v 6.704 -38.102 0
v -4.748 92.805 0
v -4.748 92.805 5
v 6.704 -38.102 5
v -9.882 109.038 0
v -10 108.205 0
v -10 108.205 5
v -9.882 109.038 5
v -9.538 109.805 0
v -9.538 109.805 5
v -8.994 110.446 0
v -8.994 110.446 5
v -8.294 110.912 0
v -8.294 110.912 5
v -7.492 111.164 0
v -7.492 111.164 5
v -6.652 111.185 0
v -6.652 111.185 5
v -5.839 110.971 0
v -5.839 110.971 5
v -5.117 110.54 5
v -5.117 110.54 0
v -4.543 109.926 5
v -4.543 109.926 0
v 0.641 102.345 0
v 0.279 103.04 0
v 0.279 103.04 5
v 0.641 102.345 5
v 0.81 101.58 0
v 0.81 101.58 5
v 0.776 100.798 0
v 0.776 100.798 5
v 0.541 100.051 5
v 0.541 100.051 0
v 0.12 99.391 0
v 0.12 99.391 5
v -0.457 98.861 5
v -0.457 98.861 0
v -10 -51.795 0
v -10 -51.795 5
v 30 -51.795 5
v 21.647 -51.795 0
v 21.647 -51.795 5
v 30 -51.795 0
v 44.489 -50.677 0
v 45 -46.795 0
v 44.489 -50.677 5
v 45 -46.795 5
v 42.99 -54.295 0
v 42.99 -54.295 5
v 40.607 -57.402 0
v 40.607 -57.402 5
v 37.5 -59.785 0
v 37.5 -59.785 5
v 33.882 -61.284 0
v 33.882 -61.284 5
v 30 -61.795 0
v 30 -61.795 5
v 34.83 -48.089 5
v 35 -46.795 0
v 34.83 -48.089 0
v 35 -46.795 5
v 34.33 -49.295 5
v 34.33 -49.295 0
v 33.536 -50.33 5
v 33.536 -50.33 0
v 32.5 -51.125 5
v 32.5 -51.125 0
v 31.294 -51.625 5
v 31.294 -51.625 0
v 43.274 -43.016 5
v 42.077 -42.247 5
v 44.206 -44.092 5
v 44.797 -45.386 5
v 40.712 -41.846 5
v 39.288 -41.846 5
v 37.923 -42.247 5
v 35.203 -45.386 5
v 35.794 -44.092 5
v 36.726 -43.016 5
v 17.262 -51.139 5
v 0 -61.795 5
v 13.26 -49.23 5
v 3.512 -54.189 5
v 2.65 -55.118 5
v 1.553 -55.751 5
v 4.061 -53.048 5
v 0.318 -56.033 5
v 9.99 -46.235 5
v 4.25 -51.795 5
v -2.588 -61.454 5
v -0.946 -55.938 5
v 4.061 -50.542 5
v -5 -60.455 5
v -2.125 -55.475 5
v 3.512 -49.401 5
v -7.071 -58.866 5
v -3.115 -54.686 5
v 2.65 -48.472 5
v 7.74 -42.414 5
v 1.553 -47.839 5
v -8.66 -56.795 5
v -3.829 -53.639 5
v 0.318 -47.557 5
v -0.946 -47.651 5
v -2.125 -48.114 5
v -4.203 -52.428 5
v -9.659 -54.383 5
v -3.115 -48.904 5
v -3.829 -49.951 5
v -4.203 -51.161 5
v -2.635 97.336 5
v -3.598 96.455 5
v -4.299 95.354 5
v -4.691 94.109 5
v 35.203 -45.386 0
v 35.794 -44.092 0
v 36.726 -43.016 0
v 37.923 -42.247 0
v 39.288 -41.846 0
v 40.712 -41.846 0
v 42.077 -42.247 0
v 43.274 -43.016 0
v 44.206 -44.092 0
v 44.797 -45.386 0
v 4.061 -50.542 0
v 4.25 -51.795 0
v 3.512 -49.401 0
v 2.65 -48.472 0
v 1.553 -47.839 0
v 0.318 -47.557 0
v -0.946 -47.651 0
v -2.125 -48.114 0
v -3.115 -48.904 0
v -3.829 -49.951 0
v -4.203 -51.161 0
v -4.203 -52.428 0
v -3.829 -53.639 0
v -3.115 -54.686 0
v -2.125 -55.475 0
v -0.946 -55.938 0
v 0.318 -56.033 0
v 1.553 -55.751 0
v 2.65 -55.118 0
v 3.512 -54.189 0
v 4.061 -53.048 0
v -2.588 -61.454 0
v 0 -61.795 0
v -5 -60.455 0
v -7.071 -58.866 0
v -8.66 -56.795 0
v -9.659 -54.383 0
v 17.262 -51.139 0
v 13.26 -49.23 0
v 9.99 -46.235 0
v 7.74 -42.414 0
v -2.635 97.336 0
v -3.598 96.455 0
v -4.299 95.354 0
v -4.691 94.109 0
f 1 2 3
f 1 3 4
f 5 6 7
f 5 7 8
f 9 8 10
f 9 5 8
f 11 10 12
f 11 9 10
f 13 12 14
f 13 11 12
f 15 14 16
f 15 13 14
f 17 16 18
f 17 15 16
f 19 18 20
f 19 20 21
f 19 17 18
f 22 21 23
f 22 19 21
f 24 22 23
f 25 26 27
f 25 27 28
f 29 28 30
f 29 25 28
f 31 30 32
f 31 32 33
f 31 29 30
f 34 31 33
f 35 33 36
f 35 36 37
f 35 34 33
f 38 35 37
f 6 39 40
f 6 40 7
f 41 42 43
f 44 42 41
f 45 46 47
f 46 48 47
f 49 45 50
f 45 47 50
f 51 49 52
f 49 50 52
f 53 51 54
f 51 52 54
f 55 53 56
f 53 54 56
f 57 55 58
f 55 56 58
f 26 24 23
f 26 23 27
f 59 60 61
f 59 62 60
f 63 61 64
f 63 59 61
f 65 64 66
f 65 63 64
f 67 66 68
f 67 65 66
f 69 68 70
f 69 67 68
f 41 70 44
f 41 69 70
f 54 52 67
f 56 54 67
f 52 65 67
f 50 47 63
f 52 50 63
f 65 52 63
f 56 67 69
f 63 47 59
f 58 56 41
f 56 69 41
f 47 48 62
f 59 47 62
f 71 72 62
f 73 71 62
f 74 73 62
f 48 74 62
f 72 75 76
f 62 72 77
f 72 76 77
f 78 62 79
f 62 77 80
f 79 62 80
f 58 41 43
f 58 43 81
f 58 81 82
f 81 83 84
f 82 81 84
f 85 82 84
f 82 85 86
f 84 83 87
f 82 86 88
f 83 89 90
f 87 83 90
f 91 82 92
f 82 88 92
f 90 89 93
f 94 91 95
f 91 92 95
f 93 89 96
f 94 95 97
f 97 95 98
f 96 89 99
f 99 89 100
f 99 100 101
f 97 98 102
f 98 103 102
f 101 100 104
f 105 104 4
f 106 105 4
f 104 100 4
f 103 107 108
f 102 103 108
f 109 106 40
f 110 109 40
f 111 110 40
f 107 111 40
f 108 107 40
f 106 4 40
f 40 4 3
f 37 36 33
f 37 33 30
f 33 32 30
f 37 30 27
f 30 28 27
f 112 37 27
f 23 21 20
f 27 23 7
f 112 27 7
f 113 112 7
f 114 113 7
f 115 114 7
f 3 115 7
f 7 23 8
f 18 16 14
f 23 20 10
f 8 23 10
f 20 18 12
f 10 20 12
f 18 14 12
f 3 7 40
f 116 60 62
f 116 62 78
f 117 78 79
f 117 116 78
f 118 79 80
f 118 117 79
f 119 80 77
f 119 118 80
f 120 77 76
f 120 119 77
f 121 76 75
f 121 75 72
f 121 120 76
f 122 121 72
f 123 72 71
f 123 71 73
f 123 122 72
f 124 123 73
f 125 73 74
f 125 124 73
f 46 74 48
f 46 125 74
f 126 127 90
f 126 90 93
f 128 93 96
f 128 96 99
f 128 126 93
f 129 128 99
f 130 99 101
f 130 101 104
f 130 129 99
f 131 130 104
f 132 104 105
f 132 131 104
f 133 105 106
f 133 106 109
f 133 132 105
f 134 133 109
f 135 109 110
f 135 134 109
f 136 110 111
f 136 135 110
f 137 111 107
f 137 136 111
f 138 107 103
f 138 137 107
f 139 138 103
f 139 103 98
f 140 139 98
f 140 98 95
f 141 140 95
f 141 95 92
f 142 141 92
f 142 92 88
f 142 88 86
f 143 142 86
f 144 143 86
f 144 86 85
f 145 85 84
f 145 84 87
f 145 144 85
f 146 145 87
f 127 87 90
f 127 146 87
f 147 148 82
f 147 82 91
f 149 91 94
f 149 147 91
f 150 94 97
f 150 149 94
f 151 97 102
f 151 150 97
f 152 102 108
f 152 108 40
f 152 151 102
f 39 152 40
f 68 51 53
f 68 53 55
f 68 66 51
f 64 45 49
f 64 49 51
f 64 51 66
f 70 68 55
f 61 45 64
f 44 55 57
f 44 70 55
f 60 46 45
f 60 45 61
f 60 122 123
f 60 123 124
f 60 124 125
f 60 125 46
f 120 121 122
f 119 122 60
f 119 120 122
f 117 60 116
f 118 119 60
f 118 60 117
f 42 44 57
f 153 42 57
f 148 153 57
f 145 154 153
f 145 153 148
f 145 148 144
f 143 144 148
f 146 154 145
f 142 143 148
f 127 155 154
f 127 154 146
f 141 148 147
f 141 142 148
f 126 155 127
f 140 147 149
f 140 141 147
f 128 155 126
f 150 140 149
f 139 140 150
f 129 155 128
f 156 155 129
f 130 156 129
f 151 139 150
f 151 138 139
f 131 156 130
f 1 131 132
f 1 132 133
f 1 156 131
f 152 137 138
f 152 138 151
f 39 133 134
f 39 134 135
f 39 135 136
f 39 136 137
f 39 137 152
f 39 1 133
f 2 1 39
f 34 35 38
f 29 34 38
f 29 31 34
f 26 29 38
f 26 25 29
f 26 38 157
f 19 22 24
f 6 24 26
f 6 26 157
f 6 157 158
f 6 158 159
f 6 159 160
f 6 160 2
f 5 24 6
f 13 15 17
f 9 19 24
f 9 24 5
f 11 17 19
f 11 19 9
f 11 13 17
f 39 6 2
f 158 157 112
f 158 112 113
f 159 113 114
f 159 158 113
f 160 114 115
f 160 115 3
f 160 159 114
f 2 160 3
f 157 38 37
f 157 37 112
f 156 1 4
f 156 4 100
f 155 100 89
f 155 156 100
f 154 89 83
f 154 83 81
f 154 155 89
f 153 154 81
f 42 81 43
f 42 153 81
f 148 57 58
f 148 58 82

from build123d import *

# Parameters (mm, degrees)
SKETCH_1_R      = 4.25
EXTRUDE_1_DEPTH = 5
FILLET_1_R      = 5
FILLET_2_R      = 15


with BuildPart() as part:
    # Эскиз1 → Бобышка-Вытянуть1 (new body)
    with BuildSketch(Plane.XY):
        with BuildLine():
            Line((-10, -51.794871795), (-10, 108.205128205))
            ThreePointArc((-10, 108.205128205), (-7.902117399, 111.066279057), (-4.542543867, 109.925857514))
            Line((-4.542543867, 109.925857514), (0.279270691, 103.039592664))
            ThreePointArc((0.279270691, 103.039592664), (0.776237817, 100.797918822), (-0.457456133, 98.861407222))
            Line((-0.457456133, 98.861407222), (-2.635311734, 97.336456313))
            ThreePointArc((-2.635311734, 97.336456313), (-4.298968487, 95.353787401), (-4.748403042, 92.804917378))
            Line((-4.748403042, 92.804917378), (6.704486397, -38.102207936))
            ThreePointArc((6.704486397, -38.102207936), (11.513553755, -47.854031847), (21.647406869, -51.794871795))
            Line((21.647406869, -51.794871795), (35, -51.794871795))
            Line((35, -51.794871795), (35, -46.794871795))
            ThreePointArc((35, -46.794871795), (40, -41.794871795), (45, -46.794871795))
            Line((45, -46.794871795), (45, -61.794871795))
            Line((45, -61.794871795), (0, -61.794871795))
            ThreePointArc((0, -61.794871795), (-7.071067812, -58.865939607), (-10, -51.794871795))
        make_face()
        with Locations((0, -51.794871795)):
            Circle(SKETCH_1_R, mode=Mode.SUBTRACT)
    extrude(amount=EXTRUDE_1_DEPTH)

    # Скругление1
    fillet_1_edges = [part.edges().sort_by_distance(p)[0] for p in [
        (35, -51.794871795, 2.5),
    ]]
    fillet(fillet_1_edges, radius=FILLET_1_R - 0.0001)  # a hair under: the kernel refuses the full size

    # Скругление2
    fillet_2_edges = [part.edges().sort_by_distance(p)[0] for p in [
        (45, -61.794871795, 2.5),
    ]]
    fillet(fillet_2_edges, radius=FILLET_2_R - 0.0001)  # a hair under: the kernel refuses the full size


solid = part.part
